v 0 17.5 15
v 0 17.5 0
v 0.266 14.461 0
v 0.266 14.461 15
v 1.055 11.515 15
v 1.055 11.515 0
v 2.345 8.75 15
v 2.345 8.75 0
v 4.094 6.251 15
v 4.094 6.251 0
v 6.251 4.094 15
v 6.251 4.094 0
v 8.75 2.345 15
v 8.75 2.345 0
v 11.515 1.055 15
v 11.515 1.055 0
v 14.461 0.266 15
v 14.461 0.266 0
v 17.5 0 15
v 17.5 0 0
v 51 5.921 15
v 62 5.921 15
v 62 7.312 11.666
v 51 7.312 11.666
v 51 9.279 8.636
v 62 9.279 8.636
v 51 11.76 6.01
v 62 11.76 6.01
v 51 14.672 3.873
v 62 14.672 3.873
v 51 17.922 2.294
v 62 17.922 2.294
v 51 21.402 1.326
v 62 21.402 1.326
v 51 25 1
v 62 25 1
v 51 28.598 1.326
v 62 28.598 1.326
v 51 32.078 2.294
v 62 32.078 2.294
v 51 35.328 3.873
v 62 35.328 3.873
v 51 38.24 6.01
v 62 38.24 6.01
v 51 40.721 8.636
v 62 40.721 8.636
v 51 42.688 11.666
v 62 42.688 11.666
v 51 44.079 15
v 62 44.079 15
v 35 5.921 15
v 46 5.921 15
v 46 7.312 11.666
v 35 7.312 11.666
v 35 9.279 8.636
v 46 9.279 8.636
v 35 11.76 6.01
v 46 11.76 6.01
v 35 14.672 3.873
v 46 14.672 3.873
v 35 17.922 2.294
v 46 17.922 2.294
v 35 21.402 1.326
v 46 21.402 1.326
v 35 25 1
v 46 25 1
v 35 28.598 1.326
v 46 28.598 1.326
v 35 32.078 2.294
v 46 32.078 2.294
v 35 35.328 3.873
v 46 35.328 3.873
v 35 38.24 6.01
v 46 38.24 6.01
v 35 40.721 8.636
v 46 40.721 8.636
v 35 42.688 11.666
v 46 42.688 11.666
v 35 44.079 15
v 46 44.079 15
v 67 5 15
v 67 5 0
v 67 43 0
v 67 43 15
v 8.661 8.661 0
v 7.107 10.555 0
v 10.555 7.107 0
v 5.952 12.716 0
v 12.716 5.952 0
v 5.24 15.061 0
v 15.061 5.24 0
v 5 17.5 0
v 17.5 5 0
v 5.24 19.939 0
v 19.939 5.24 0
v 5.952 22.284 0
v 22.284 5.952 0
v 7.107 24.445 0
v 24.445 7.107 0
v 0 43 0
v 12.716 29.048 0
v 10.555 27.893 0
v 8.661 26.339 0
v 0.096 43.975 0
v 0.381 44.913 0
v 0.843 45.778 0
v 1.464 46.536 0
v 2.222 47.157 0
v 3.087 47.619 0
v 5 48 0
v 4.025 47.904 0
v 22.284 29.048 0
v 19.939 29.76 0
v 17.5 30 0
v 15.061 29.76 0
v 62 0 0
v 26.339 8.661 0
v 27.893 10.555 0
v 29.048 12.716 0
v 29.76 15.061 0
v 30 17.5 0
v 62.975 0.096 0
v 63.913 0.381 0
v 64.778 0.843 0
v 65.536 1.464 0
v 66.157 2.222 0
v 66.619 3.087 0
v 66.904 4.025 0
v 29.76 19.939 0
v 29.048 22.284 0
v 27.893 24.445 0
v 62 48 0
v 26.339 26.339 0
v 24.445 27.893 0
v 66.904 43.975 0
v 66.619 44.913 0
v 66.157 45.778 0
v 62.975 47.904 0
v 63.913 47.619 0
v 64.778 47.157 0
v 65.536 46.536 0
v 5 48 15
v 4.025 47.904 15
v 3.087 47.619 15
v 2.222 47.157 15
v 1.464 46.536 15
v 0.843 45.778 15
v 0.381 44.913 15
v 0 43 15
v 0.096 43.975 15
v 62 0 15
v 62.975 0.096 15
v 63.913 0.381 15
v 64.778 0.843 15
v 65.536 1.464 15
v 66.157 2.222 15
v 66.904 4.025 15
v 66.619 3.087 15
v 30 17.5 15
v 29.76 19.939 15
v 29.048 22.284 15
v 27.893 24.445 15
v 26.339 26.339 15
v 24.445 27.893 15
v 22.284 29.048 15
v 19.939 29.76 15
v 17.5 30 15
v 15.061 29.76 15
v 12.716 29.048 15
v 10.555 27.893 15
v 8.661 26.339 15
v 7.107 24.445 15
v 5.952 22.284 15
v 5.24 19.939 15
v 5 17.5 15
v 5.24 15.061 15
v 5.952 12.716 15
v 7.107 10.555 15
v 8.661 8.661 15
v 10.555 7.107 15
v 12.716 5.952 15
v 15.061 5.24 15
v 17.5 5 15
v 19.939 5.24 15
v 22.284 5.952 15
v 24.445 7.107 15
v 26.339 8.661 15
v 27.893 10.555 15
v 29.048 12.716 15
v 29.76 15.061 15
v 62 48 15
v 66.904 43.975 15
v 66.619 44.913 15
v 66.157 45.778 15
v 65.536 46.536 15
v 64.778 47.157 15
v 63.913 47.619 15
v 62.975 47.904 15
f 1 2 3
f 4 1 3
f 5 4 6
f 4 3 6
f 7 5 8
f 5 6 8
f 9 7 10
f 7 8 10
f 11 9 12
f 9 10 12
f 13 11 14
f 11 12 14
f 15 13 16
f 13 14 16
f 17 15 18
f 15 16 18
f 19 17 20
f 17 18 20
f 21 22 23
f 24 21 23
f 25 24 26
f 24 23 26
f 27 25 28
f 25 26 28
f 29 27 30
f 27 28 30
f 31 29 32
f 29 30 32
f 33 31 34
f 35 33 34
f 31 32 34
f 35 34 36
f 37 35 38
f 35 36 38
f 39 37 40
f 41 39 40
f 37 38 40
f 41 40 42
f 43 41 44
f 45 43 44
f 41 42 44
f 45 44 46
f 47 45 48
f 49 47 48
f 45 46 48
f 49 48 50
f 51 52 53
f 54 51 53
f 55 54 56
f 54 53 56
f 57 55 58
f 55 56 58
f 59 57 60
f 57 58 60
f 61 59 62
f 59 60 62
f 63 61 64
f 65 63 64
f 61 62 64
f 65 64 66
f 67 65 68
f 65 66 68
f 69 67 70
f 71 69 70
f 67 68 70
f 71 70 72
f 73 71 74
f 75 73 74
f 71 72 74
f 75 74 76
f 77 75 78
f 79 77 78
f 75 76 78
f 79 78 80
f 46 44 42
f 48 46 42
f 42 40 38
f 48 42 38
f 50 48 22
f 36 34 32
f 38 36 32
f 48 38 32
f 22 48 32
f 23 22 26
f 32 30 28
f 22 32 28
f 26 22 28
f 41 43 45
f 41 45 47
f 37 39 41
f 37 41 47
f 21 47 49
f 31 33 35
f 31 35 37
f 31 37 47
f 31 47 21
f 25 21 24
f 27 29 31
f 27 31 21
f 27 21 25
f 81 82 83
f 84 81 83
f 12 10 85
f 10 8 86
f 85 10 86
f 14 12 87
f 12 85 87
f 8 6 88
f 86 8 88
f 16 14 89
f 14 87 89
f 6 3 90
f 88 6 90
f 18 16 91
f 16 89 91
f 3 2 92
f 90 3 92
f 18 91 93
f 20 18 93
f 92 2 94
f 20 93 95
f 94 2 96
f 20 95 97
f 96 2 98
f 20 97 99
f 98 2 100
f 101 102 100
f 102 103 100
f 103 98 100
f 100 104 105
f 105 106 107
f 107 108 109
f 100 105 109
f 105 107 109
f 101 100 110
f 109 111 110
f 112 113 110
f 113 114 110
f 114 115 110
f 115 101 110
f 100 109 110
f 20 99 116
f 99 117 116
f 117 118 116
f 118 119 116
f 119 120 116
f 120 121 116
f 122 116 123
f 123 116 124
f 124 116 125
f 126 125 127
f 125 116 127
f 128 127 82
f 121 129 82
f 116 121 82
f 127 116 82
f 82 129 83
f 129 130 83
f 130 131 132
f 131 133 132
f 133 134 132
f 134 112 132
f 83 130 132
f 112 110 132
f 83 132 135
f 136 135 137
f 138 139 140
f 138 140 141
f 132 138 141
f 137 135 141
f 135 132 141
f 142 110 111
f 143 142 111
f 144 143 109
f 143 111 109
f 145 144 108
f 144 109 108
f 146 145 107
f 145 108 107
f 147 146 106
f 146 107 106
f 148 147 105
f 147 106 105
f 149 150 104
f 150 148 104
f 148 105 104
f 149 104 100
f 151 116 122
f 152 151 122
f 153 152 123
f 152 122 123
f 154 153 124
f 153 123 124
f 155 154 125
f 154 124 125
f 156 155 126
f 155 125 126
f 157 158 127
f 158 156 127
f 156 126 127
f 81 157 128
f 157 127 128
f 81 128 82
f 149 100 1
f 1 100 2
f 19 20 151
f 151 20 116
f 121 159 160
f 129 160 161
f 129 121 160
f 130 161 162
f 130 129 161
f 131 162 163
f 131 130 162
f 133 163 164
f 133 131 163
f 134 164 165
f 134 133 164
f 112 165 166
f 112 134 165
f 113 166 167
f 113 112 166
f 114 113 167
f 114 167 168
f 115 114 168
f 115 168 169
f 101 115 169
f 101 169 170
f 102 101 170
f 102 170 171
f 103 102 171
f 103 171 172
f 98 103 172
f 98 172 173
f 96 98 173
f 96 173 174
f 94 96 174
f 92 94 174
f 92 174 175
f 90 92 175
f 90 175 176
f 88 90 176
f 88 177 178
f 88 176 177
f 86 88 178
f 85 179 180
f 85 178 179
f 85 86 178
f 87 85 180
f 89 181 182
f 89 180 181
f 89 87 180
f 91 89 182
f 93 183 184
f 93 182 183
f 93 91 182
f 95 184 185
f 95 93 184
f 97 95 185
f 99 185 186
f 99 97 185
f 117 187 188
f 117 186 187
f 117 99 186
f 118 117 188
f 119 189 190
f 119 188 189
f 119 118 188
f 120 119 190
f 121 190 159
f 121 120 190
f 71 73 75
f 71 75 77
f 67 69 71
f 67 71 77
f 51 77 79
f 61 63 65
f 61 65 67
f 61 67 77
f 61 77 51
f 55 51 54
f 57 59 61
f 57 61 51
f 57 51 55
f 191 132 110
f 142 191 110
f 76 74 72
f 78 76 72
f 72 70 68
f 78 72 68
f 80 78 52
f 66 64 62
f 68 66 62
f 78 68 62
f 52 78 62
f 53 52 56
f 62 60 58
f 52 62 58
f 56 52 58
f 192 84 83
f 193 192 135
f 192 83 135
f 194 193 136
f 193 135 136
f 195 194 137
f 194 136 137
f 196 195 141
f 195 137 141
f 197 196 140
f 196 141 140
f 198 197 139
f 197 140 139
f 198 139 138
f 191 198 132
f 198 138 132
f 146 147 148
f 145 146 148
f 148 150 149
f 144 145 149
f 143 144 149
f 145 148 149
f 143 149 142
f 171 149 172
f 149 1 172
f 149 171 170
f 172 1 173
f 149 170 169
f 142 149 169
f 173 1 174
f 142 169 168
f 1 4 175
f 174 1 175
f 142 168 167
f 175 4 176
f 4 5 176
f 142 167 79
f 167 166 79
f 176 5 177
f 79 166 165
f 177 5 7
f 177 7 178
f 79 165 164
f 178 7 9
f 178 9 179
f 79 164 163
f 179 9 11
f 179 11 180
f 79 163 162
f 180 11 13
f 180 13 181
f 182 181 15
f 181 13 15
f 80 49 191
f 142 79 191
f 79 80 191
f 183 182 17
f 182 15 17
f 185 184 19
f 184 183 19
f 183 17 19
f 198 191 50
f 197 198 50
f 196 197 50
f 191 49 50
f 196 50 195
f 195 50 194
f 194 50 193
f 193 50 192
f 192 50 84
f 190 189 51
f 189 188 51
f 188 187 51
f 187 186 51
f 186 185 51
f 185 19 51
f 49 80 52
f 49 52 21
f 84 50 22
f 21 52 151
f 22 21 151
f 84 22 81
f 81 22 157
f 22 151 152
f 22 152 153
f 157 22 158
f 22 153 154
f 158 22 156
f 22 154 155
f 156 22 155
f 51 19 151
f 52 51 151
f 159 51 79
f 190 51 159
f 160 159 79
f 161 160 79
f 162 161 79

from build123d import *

# Parameters (mm, degrees)
F0_R     = 12.5
F1_DEPTH = 21
F2_W     = 11
F2_H     = 20
F4_W     = 67.492016
F4_H     = 6.775262
F5_DEPTH = 48.001


with BuildPart() as f1:
    # F0 (on Top) → F1 (new body)
    with BuildSketch(Plane.XY):
        with BuildLine():
            ThreePointArc((0, 17.5), (5.125631, 5.125631), (17.5, 0))
            Line((17.5, 0), (62, 0))
            ThreePointArc((62, 0), (65.535534, 1.464466), (67, 5))
            Line((67, 5), (67, 43))
            ThreePointArc((67, 43), (65.535534, 46.535534), (62, 48))
            Line((62, 48), (5, 48))
            ThreePointArc((5, 48), (1.464466, 46.535534), (0, 43))
            Line((0, 43), (0, 17.5))
        make_face()
        with Locations((17.5, 17.5)):
            Circle(F0_R, mode=Mode.SUBTRACT)
    extrude(amount=F1_DEPTH)

    # F2 (on face) → F3 (revolve, cut)
    with BuildSketch(Plane.XY.offset(21)):
        with Locations((40.5, 15)):
            Rectangle(F2_W, F2_H)
        with Locations((56.5, 15)):
            Rectangle(F2_W, F2_H)
    revolve(axis=Axis((40.5, 25, 21), (1, 0, 0)), mode=Mode.SUBTRACT)

    # F4 (on face) → F5 (cut, through all)
    with BuildSketch(Plane.XZ):
        with Locations((33.746008, 18.387631)):
            Rectangle(F4_W, F4_H)
    extrude(amount=-F5_DEPTH, mode=Mode.SUBTRACT)


solid = f1.part
